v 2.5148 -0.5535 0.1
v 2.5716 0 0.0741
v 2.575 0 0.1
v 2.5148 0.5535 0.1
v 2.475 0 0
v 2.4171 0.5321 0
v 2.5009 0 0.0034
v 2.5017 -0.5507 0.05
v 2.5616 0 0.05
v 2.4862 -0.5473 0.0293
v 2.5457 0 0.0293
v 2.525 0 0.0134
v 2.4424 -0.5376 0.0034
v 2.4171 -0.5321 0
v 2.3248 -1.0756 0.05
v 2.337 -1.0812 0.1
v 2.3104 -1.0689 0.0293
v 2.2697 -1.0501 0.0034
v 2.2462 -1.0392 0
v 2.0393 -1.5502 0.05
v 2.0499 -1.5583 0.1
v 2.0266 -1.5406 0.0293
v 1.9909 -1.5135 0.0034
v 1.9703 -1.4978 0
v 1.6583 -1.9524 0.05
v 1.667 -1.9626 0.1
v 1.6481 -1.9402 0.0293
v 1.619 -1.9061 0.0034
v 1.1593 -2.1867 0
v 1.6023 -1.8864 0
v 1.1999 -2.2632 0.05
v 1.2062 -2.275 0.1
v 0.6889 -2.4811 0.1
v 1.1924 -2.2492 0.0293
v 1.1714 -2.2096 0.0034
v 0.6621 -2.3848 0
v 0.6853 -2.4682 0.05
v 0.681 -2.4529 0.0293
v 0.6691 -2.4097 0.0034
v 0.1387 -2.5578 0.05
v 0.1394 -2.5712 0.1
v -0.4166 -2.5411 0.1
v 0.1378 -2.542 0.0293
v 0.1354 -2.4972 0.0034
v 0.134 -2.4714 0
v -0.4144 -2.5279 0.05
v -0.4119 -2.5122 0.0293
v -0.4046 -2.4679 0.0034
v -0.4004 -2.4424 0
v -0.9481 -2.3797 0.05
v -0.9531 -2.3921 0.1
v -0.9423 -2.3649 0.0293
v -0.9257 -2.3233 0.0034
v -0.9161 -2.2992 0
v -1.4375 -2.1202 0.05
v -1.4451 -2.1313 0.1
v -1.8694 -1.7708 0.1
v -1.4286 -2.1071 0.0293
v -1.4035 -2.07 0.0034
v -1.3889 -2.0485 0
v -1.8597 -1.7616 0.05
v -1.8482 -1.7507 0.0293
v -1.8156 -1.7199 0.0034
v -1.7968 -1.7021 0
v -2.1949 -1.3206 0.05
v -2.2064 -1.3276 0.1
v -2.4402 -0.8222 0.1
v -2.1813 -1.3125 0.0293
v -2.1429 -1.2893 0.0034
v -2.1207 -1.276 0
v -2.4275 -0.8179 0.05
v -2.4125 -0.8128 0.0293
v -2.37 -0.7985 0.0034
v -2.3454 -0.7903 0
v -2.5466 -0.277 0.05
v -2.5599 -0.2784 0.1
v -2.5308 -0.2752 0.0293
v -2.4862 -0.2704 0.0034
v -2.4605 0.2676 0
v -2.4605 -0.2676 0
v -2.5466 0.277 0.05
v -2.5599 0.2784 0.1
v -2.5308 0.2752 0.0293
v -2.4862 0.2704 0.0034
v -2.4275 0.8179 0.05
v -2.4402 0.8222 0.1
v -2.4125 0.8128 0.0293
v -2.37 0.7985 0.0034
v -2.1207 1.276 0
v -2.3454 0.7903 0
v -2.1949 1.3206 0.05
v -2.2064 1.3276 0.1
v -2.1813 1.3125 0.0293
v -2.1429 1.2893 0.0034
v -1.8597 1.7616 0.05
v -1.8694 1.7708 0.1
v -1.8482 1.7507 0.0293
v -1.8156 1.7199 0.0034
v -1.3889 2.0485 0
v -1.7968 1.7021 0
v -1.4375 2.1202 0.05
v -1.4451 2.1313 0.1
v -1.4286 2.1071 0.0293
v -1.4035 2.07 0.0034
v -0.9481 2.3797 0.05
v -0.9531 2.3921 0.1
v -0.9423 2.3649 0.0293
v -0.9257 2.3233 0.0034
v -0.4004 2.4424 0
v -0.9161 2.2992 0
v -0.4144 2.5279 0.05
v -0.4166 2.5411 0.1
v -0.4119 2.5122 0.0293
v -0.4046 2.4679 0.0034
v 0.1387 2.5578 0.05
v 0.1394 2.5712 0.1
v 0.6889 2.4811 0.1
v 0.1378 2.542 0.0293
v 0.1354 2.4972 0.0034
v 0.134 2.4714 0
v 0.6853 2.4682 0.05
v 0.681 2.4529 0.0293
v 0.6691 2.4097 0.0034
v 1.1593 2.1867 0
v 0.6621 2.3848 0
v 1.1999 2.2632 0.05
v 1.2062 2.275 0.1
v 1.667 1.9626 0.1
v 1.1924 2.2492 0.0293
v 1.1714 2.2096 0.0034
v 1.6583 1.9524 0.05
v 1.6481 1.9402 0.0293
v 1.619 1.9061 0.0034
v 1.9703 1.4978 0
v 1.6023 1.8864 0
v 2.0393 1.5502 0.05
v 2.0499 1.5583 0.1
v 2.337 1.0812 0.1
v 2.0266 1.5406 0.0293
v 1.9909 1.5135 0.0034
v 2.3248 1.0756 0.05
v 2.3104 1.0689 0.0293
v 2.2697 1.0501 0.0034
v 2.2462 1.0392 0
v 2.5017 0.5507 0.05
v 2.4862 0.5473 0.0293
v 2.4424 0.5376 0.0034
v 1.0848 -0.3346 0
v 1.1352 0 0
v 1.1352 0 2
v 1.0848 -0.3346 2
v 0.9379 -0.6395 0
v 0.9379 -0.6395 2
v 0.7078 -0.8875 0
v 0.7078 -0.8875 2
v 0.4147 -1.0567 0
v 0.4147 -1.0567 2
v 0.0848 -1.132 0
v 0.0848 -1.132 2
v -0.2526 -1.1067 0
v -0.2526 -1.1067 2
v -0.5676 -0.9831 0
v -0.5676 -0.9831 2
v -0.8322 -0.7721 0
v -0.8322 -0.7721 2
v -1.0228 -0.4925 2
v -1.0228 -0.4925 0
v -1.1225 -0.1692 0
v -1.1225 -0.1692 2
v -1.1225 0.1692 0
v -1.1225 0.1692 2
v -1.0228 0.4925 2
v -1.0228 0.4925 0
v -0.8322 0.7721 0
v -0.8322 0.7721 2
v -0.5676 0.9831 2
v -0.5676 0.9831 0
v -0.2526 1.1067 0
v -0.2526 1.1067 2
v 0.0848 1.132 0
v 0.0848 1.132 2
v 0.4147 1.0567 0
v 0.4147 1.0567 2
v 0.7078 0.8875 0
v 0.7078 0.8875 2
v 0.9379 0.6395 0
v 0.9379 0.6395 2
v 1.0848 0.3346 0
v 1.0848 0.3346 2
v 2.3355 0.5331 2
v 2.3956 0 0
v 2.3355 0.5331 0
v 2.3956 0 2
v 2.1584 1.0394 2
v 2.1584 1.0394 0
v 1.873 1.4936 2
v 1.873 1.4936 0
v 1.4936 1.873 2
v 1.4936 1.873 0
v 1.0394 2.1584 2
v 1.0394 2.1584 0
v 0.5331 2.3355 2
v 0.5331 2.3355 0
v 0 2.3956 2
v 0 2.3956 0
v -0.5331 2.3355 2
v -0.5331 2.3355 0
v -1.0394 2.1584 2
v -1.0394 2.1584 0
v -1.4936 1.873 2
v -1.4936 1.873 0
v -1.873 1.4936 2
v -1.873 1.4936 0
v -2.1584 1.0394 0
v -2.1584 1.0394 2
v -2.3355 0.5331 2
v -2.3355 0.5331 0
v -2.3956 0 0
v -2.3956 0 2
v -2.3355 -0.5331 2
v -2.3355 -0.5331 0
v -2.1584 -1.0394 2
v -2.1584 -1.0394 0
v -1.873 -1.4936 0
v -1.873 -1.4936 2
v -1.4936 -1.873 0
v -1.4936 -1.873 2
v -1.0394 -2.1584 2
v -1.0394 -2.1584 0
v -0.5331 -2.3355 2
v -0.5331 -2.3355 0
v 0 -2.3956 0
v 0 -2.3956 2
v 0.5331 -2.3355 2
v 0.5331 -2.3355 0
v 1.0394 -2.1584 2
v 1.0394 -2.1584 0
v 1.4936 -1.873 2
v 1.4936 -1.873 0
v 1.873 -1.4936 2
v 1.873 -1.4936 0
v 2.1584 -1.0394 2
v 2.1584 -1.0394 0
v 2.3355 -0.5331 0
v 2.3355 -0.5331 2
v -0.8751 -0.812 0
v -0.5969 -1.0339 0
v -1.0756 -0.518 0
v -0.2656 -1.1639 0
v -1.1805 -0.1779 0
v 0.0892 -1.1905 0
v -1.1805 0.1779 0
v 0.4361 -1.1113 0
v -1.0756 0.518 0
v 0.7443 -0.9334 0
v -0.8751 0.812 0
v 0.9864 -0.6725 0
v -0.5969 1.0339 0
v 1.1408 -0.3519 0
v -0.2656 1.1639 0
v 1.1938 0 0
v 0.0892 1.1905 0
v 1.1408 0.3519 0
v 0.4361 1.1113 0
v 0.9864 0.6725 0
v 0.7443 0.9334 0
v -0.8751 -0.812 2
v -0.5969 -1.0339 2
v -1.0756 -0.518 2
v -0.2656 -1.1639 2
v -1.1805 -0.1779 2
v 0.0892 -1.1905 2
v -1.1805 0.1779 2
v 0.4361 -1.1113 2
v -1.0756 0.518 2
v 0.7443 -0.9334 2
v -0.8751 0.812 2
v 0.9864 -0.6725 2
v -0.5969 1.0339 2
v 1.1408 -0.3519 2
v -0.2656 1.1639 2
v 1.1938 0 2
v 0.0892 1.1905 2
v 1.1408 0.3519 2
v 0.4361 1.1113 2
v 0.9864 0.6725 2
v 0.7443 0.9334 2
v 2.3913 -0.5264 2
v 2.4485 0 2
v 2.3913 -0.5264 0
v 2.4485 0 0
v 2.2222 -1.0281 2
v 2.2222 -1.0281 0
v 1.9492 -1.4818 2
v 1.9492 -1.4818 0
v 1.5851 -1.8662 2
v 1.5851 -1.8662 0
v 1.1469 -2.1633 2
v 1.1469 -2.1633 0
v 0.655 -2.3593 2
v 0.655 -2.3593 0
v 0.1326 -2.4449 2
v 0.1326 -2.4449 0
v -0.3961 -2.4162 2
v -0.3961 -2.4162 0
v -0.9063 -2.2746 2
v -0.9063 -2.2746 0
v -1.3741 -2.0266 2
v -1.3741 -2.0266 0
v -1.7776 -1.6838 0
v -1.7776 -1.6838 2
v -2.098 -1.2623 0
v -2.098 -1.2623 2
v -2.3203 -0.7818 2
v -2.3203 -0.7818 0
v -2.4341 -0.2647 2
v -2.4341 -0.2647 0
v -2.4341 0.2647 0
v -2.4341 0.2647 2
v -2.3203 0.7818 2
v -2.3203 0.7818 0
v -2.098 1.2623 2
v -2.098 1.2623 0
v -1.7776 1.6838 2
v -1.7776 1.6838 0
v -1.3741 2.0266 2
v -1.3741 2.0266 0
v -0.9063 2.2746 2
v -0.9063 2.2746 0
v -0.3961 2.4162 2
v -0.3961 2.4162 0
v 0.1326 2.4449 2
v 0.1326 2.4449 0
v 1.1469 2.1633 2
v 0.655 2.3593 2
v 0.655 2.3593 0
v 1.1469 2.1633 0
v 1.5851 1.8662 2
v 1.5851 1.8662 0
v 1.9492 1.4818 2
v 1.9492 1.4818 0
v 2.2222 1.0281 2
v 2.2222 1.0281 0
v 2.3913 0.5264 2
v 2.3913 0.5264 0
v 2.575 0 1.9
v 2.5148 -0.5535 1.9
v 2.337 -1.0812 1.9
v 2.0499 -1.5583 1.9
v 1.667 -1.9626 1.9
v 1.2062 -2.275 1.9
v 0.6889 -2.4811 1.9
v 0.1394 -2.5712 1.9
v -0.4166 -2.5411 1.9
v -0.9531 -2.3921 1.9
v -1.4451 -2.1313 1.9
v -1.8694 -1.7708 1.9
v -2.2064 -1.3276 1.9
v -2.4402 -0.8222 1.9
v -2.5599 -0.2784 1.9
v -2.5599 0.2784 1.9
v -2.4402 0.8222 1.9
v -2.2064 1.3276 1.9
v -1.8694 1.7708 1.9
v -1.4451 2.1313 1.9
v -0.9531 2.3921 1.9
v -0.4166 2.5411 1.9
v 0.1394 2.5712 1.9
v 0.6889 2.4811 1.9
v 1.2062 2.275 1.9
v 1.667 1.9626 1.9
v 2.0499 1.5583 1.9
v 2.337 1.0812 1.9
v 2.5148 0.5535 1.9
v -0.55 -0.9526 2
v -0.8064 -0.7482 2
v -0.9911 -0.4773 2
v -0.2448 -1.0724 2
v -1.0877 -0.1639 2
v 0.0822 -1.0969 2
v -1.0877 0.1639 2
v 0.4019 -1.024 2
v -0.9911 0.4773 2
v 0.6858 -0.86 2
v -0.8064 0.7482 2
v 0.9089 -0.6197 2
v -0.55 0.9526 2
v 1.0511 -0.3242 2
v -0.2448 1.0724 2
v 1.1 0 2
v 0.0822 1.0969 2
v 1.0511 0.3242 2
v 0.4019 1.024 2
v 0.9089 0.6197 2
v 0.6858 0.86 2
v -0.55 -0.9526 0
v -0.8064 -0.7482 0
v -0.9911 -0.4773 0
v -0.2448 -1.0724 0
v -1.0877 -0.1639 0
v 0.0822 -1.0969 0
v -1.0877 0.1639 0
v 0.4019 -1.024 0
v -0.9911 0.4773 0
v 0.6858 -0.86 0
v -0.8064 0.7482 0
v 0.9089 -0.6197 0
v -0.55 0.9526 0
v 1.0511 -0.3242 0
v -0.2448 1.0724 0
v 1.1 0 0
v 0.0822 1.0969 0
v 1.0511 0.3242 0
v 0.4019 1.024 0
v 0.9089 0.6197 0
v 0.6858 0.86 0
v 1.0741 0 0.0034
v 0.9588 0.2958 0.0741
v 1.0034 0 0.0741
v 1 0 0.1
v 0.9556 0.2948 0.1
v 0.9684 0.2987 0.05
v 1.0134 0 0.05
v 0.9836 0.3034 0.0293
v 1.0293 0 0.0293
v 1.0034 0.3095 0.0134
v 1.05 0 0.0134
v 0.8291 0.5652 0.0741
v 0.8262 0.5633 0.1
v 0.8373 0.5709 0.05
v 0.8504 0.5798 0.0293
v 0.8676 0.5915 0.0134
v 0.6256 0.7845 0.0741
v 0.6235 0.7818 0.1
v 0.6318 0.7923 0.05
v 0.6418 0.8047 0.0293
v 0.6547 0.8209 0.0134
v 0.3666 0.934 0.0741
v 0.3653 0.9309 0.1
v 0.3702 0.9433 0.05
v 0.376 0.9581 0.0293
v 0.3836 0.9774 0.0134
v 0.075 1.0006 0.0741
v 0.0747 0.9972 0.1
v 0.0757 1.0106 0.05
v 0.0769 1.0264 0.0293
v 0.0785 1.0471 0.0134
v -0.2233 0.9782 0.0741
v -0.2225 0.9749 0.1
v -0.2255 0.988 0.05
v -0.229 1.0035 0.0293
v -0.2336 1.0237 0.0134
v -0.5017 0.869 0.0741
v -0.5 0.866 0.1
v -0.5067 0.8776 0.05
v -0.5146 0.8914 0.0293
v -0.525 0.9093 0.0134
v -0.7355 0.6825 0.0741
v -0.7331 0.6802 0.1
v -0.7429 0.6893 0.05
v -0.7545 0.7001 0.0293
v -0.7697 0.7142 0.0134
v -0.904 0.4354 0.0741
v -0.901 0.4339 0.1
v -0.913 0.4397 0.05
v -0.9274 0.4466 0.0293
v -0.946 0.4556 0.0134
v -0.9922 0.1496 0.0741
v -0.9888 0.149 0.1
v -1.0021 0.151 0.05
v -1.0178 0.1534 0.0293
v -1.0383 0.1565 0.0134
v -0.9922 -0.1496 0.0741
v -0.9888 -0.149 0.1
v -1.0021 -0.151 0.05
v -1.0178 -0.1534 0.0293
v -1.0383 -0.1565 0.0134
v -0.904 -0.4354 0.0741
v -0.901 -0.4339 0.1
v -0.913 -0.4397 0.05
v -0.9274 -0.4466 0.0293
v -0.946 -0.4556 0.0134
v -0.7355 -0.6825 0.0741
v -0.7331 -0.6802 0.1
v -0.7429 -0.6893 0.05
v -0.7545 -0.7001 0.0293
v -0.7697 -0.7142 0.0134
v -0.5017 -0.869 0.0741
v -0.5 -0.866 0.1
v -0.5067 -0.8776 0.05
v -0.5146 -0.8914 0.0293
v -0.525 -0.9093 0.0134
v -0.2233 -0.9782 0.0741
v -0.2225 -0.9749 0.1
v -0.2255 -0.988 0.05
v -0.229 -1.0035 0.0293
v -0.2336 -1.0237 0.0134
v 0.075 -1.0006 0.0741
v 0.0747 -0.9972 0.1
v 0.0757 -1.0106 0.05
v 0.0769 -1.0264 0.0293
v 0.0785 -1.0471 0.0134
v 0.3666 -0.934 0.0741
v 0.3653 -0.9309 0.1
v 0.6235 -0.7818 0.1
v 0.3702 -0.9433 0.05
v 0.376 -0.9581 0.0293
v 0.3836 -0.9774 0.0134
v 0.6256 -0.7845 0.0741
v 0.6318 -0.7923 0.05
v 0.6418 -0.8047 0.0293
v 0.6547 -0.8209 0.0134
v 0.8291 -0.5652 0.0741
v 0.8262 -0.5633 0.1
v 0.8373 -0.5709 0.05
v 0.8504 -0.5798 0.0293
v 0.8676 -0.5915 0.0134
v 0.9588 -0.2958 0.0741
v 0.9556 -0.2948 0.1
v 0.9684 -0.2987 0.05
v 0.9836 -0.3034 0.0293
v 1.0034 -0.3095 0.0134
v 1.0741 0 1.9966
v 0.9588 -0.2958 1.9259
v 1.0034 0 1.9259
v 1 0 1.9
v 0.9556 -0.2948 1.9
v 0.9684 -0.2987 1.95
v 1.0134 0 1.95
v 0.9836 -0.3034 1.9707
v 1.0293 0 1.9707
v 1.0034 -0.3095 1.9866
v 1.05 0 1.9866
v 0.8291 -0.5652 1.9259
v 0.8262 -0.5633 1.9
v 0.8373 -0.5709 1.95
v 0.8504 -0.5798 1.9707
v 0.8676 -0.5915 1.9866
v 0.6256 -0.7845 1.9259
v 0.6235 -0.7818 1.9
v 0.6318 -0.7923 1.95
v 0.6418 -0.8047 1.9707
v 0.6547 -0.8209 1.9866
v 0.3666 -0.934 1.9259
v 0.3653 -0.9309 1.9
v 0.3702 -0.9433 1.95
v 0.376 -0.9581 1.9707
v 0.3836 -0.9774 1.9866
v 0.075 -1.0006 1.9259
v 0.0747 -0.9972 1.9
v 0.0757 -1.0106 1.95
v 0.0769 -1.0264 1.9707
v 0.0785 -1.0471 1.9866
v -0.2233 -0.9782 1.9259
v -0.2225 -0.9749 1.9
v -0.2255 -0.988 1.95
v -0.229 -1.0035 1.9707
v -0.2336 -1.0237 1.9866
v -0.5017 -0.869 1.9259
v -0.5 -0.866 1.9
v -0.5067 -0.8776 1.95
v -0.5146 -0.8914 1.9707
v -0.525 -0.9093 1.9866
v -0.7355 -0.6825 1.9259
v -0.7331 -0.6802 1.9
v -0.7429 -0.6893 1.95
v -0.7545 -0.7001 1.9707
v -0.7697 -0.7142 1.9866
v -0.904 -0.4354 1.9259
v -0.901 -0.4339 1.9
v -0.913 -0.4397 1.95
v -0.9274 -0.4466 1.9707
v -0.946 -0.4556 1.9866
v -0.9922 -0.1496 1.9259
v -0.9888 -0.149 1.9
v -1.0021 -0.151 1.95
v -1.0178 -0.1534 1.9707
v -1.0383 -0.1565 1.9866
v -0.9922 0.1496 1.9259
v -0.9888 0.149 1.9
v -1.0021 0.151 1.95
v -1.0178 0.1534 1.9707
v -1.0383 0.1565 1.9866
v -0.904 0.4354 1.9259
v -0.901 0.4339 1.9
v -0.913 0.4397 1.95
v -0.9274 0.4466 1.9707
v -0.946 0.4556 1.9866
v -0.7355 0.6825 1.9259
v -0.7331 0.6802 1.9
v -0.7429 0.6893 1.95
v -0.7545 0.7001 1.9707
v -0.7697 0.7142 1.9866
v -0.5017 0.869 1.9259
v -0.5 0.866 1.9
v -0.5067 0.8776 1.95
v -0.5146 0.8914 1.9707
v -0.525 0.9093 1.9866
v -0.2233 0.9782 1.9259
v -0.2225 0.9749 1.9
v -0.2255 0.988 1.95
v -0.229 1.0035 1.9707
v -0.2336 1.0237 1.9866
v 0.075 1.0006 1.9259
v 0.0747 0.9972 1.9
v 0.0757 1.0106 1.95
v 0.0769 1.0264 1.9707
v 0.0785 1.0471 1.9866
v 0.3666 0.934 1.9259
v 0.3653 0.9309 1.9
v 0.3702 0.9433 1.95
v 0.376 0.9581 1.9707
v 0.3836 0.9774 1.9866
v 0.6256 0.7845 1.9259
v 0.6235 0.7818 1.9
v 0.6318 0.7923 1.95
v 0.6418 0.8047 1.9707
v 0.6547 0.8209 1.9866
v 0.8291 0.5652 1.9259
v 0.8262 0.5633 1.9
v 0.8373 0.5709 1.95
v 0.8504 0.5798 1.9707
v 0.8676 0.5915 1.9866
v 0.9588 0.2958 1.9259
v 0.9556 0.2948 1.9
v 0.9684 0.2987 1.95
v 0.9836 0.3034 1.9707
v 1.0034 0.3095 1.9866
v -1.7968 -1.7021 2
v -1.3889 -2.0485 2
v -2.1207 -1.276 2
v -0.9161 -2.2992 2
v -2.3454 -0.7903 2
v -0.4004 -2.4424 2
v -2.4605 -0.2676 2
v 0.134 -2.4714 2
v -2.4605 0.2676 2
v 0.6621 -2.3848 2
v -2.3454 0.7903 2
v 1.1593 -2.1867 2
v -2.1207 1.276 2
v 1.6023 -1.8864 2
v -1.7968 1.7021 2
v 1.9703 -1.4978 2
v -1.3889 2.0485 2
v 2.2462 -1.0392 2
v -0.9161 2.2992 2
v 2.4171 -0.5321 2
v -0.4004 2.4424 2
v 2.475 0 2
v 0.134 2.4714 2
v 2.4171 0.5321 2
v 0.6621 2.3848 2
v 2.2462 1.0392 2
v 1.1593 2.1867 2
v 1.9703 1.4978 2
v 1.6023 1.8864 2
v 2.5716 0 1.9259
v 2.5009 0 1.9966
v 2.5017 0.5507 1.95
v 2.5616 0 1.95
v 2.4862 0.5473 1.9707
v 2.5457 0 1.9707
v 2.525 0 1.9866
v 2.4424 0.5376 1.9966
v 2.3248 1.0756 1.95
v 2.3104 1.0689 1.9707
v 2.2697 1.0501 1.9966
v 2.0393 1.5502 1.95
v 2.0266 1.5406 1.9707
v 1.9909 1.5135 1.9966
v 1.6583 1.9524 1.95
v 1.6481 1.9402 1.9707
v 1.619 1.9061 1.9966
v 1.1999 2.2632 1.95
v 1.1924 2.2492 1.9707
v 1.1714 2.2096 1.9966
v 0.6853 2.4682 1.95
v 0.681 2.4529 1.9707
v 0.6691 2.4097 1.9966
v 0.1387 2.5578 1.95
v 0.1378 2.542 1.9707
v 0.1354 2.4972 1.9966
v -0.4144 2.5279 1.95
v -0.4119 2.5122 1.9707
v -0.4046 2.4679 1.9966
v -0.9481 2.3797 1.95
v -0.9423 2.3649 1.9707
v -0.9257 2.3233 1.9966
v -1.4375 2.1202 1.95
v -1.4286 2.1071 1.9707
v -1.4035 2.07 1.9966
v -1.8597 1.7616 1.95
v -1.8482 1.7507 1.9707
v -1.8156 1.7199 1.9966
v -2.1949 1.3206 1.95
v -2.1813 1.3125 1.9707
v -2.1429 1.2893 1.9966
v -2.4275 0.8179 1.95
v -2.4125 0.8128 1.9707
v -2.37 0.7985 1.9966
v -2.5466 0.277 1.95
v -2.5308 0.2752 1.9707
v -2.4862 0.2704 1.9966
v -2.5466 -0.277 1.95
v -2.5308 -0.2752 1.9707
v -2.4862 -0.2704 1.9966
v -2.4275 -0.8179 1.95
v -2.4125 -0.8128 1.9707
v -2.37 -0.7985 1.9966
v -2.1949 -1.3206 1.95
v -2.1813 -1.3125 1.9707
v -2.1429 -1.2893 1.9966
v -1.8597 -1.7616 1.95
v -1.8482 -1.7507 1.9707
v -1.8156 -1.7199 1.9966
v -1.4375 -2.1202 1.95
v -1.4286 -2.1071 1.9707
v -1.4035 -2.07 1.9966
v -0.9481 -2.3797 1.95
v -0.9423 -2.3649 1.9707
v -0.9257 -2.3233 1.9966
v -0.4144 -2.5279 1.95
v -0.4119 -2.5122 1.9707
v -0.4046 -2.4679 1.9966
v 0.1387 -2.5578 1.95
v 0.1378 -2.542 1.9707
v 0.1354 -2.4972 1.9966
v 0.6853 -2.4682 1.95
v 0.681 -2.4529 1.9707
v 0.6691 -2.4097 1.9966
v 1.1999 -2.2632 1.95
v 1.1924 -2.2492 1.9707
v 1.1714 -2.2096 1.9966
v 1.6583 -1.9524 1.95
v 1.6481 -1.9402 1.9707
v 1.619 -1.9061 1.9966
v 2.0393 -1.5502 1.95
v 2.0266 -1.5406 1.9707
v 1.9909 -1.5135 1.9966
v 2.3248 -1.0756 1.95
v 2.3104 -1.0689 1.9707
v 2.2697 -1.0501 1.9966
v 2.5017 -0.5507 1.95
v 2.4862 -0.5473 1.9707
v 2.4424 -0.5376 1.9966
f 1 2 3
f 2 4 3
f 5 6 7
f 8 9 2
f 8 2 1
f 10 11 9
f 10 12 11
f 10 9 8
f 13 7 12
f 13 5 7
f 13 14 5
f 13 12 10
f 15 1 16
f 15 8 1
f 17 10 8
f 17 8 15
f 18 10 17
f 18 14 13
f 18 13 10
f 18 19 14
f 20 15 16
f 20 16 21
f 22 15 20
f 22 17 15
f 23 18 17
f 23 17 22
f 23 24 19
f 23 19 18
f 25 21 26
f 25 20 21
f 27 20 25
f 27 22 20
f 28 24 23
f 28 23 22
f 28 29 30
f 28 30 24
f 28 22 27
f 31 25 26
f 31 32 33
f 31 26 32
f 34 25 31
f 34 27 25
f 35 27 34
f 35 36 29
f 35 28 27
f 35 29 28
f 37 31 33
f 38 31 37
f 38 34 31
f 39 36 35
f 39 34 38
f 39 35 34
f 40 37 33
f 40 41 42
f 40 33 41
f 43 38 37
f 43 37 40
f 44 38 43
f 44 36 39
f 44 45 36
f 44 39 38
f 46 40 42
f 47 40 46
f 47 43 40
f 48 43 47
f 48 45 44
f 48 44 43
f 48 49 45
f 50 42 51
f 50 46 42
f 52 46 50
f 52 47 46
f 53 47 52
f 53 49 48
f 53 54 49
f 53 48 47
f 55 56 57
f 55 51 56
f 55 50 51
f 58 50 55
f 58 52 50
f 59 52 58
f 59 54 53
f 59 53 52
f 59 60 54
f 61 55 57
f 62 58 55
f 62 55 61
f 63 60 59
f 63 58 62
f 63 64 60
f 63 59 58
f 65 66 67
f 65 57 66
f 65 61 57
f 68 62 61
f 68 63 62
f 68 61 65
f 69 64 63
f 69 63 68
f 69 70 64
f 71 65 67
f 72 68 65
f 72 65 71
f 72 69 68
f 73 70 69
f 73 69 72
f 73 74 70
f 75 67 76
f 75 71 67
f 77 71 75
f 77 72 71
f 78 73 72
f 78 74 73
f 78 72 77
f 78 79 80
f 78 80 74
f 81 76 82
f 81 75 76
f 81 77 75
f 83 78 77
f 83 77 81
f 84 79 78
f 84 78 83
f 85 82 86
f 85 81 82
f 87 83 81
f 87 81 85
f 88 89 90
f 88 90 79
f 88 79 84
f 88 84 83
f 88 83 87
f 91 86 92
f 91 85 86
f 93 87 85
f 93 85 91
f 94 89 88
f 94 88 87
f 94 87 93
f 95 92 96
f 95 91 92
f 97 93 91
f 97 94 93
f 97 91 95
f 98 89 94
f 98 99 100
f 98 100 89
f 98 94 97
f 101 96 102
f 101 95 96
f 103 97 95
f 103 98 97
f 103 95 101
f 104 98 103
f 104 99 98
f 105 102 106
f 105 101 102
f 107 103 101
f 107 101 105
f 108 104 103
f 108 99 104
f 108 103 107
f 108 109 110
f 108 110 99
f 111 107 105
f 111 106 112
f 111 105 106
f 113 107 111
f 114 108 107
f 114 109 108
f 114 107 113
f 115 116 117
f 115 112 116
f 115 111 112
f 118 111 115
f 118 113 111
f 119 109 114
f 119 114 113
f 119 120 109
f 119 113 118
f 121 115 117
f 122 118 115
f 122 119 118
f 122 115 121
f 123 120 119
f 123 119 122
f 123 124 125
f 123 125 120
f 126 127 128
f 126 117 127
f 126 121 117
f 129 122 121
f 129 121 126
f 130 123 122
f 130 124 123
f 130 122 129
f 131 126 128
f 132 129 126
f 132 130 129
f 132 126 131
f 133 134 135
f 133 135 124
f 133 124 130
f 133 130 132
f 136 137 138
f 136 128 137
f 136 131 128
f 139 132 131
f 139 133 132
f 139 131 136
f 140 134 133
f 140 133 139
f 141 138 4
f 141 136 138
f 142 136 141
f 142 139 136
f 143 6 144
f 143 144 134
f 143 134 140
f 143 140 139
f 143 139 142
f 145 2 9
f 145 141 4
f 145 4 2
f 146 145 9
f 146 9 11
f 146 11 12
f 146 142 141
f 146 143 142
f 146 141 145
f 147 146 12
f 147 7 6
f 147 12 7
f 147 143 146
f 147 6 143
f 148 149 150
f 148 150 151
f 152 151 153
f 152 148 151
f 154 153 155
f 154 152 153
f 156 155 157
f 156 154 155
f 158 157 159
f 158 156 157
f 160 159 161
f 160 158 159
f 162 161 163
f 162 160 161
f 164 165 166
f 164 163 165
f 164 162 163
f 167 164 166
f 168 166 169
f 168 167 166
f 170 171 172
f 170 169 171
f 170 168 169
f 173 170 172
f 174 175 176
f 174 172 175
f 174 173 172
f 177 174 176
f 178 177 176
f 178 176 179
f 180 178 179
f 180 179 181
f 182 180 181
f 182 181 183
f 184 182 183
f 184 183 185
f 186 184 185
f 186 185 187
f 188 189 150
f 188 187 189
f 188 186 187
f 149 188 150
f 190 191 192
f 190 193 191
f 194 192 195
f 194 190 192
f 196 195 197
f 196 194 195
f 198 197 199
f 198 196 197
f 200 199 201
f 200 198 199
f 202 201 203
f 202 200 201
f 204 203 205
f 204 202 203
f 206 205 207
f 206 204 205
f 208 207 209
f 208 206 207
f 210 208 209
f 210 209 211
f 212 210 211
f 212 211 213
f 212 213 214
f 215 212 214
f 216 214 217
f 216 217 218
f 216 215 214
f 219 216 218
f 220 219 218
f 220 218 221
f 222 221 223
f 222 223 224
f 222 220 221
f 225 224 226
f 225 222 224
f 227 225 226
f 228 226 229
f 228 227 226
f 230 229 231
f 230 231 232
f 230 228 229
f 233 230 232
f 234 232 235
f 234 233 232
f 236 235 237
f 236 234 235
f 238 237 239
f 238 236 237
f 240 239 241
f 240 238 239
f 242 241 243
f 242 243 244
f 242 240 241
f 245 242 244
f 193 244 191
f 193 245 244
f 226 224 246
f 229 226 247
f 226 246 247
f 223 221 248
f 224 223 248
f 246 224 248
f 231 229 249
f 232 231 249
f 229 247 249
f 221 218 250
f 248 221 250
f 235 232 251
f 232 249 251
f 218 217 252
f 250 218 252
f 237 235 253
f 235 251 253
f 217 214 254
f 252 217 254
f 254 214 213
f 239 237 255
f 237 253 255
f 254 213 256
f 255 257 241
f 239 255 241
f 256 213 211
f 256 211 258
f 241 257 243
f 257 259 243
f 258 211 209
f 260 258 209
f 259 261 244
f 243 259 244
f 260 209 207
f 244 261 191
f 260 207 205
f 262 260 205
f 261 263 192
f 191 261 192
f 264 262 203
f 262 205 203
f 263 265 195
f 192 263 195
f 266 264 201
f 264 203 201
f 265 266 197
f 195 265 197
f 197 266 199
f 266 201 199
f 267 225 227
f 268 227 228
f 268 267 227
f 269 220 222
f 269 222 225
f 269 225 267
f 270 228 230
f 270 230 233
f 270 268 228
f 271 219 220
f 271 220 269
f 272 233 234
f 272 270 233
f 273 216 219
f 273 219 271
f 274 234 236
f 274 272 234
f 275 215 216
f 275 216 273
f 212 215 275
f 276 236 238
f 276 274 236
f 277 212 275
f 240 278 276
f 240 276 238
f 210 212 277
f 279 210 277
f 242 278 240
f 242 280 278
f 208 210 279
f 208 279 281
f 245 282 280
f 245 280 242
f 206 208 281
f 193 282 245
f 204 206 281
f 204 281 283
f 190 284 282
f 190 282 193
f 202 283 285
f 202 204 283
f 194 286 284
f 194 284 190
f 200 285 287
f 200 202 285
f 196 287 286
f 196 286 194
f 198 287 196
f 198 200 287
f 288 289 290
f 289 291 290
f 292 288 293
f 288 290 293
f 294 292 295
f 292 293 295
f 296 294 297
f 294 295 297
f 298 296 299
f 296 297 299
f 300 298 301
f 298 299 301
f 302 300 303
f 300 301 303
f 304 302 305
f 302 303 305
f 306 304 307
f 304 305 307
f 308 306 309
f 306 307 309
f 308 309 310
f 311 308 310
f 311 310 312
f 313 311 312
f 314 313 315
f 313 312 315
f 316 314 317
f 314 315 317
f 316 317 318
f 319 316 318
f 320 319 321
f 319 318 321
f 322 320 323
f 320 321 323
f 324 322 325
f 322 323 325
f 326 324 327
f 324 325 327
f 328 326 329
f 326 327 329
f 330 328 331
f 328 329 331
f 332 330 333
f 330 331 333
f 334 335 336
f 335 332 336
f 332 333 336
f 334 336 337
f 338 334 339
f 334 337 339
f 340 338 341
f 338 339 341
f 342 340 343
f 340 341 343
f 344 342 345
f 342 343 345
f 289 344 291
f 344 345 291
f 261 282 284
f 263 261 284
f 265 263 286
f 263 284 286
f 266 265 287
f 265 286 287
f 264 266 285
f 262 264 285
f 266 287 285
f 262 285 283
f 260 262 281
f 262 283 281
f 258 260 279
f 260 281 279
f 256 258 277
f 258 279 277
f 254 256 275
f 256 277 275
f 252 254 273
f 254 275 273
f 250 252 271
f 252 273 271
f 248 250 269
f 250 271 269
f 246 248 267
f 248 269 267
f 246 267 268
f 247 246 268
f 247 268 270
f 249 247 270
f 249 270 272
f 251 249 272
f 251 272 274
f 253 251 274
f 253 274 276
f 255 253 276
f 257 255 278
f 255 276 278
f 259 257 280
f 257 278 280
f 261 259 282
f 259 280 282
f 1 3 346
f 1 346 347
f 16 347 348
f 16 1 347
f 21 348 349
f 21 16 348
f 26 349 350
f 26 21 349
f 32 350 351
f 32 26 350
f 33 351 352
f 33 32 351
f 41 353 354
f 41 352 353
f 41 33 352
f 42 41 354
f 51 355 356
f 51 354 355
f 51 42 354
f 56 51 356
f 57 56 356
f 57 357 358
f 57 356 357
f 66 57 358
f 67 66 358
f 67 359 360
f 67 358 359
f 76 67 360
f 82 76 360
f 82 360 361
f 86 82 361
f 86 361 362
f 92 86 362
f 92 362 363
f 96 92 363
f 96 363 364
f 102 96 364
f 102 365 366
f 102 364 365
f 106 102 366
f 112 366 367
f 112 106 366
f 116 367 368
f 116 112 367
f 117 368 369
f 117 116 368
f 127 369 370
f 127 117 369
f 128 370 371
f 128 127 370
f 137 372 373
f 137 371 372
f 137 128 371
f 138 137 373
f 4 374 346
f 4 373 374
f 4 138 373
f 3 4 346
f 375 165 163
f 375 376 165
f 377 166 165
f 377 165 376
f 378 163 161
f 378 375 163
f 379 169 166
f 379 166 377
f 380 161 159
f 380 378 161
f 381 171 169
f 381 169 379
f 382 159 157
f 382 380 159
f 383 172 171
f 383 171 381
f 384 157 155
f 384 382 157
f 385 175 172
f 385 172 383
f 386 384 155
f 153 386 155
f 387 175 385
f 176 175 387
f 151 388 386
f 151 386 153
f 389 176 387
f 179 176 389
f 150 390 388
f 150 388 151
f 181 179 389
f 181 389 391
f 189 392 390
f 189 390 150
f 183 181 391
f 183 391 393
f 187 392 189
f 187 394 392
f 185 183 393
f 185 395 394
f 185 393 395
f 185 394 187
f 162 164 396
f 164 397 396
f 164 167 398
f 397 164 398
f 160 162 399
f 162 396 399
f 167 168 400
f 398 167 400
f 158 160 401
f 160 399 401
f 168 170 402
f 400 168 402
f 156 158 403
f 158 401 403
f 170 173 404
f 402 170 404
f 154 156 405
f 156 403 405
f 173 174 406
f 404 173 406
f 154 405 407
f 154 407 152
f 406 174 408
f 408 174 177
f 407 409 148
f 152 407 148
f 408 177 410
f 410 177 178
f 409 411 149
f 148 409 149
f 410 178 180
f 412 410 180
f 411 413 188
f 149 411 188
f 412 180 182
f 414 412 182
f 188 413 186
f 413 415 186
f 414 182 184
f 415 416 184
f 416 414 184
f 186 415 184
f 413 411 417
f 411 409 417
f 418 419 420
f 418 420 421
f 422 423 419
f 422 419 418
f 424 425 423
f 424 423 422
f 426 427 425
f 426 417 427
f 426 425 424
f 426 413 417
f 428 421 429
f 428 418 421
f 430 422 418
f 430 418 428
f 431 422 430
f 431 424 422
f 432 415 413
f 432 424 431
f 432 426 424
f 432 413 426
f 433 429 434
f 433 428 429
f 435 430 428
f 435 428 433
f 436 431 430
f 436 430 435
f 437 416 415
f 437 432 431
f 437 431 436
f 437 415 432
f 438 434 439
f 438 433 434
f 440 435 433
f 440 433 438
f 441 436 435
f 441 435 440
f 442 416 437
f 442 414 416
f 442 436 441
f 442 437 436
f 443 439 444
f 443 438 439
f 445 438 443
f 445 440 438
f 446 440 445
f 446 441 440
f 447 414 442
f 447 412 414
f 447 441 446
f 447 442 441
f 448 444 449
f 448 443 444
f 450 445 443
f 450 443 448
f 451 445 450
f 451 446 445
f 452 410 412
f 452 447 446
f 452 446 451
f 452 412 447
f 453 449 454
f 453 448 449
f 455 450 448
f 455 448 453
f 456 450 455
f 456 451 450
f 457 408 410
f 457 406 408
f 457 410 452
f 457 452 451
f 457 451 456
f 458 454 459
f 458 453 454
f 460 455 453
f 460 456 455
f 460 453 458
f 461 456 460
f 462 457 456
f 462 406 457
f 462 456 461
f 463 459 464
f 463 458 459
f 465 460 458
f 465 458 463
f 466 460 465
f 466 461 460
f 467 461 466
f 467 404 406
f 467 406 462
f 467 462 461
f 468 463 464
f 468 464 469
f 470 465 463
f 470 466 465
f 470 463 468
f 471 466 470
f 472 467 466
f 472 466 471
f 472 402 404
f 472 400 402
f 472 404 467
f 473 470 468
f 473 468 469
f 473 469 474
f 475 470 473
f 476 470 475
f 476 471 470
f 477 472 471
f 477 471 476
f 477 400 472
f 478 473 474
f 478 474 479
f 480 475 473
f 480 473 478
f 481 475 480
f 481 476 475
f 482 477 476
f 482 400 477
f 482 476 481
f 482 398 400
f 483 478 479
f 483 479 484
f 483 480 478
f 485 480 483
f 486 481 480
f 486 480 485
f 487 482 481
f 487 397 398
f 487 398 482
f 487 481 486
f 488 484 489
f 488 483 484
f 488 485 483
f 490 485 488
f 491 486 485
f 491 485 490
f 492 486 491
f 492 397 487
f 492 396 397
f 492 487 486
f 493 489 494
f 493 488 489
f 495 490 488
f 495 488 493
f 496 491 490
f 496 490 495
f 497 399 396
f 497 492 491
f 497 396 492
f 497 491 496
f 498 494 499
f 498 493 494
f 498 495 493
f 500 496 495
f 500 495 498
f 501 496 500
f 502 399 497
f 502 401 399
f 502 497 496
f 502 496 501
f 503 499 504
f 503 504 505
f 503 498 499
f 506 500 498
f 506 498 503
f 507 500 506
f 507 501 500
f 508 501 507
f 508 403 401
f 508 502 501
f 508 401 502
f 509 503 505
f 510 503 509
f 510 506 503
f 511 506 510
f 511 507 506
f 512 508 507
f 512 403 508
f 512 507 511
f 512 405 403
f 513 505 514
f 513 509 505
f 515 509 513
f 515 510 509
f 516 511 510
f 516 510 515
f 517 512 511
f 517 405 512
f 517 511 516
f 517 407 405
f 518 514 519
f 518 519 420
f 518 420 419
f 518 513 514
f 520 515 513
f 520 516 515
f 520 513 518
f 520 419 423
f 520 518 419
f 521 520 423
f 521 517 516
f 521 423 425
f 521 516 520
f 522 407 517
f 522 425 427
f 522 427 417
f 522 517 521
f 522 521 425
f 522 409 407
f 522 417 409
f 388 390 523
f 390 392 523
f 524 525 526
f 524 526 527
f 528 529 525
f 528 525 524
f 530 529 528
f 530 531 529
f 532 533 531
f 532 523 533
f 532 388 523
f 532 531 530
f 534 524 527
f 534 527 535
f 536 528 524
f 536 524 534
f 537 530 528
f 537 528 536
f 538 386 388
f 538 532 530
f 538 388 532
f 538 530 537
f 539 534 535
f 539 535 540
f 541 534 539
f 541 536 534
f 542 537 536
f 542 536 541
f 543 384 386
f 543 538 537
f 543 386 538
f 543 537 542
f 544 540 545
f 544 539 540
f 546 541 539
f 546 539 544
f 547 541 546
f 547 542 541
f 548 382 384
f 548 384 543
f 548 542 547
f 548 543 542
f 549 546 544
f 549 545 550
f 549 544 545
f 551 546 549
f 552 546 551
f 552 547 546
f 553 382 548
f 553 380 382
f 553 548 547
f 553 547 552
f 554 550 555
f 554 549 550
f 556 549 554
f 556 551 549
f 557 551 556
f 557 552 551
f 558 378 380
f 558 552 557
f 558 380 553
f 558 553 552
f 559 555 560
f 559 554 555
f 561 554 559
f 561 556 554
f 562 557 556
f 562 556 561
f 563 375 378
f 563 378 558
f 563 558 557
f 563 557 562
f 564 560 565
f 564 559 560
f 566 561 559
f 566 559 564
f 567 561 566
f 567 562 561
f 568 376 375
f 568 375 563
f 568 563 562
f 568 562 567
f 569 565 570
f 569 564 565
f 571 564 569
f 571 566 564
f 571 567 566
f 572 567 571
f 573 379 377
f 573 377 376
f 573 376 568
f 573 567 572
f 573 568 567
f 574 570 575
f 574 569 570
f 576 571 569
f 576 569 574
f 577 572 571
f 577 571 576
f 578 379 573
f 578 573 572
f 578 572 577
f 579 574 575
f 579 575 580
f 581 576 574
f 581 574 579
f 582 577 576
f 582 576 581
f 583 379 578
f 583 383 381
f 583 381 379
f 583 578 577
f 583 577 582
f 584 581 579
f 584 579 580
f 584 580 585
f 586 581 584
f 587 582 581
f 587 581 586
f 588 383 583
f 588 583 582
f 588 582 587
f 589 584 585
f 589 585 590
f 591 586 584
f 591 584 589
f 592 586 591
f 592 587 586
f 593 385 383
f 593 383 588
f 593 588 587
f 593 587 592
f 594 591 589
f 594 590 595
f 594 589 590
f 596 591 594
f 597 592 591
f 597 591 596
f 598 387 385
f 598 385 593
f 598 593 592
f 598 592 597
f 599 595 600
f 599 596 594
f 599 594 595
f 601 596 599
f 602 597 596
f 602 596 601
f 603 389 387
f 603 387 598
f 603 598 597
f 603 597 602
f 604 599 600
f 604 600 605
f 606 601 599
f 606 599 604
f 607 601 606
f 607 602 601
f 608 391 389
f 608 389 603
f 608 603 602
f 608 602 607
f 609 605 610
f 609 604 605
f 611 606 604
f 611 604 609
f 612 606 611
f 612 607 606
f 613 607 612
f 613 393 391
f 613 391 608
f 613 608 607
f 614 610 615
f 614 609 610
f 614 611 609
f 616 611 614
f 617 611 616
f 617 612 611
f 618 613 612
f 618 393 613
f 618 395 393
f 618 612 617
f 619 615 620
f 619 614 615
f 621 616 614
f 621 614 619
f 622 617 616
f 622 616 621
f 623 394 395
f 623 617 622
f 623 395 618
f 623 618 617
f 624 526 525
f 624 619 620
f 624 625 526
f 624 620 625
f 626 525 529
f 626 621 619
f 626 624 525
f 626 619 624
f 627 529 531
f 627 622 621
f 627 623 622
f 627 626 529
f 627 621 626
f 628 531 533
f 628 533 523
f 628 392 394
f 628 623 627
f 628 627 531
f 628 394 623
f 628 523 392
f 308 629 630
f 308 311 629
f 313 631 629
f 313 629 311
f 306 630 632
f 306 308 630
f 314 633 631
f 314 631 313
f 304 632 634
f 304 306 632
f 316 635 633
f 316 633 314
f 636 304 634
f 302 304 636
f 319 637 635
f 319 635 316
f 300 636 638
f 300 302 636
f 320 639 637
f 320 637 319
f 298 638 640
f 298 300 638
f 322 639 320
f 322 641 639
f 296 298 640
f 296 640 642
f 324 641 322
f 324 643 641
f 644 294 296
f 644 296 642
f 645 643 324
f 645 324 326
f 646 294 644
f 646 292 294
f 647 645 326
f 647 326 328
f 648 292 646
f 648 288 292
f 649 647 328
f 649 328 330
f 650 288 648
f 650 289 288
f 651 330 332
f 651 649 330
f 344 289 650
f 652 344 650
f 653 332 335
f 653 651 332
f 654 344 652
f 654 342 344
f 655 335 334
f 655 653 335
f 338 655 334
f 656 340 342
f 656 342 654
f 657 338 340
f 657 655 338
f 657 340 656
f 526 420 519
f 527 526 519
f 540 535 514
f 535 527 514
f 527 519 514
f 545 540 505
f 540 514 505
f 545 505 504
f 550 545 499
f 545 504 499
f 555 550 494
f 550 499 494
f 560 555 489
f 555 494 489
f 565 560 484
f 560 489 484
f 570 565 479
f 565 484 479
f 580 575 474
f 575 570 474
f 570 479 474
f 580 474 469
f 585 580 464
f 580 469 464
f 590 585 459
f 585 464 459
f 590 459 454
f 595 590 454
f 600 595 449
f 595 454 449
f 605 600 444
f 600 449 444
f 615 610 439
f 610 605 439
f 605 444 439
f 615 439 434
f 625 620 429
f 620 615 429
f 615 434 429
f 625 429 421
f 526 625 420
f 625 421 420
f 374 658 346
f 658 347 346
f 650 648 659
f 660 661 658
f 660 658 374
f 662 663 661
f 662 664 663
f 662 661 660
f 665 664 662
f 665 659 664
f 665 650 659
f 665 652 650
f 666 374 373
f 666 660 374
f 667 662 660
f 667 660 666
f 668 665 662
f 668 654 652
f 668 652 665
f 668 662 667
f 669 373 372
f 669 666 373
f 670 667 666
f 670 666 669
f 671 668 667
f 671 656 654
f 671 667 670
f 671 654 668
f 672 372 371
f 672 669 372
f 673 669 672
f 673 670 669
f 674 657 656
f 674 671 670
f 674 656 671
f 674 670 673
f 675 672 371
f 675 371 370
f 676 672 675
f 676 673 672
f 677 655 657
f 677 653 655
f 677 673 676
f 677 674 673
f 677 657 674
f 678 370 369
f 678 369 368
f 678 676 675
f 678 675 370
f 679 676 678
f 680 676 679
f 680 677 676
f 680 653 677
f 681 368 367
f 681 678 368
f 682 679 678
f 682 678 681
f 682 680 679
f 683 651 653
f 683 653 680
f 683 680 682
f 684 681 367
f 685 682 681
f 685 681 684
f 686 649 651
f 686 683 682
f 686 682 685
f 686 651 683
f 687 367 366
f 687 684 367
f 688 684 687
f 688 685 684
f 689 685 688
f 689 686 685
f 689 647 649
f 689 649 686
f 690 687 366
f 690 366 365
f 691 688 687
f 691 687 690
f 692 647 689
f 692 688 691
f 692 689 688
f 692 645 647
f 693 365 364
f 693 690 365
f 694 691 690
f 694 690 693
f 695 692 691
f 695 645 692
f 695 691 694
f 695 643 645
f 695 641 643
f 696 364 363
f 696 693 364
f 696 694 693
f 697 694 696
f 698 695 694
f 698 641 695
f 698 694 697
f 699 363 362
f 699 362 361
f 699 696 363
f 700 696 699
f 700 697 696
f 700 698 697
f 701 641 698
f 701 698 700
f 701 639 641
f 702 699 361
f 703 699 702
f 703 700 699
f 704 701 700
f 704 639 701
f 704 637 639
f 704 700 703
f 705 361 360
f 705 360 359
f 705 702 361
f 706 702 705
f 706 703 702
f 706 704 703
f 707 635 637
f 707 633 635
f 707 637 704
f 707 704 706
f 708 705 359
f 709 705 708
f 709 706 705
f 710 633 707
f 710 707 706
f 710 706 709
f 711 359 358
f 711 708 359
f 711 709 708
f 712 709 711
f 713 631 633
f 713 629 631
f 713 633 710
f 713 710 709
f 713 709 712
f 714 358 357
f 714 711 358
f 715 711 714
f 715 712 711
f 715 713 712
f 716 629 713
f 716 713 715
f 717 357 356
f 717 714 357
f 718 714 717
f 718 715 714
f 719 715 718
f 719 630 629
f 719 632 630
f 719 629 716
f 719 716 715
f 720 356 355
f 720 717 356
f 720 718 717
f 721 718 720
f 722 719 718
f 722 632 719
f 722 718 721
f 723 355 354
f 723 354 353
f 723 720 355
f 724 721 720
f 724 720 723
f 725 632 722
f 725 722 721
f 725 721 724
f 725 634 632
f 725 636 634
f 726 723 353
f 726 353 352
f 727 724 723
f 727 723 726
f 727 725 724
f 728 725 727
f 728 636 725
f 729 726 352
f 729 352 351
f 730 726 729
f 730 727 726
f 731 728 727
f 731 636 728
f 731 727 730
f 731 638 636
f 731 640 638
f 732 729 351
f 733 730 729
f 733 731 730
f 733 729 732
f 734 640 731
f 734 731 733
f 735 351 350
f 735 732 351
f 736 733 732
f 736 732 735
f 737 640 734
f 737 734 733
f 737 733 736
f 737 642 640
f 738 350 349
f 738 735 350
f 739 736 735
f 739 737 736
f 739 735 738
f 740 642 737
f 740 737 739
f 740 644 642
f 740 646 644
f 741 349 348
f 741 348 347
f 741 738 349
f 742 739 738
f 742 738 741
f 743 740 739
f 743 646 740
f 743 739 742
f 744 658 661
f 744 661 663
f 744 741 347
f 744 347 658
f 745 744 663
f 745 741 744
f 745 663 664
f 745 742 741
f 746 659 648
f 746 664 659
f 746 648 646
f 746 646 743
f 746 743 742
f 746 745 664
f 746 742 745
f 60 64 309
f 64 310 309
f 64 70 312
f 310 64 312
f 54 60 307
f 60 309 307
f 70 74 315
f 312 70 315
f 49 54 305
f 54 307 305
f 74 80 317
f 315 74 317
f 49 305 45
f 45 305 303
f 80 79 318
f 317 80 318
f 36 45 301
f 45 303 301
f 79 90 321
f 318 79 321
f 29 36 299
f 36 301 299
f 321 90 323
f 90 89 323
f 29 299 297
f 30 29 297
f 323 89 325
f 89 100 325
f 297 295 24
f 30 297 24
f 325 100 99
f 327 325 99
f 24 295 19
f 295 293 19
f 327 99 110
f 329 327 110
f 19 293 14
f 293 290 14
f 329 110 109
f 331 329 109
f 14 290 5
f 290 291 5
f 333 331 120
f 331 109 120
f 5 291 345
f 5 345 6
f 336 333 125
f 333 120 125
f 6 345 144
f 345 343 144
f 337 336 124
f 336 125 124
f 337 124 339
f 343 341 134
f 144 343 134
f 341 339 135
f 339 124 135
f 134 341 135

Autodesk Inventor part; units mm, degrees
ref_plane "YZ Plane" through (0, 0, 0) normal (1, 0, 0) x (0, 1, 0)
ref_plane "XZ Plane" through (0, 0, 0) normal (0, 1, 0) x (-1, 0, 0)
ref_plane "XY Plane" through (0, 0, 0) normal (0, 0, 1) x (1, 0, 0)
sketch "Skizze1" plane through (0, 0, 0) normal (0, 0, 1) x (1, 0, 0)
  circle A0 centre (0, 0) radius 2.575 construction
  circle A1 centre (0, 0) radius 1.45 construction
  circle A2 centre (0, 0) radius 2.575
  circle A3 centre (0, 0) radius 2.4485
  circle A4 centre (0, 0) radius 1
  circle A5 centre (0, 0) radius 1.1352
  point P0 (0, 0)
  dimension "d0" = 2
extrude "Extrusion1" add sketch "Skizze1" along normal blind 2
sketch "Skizze2" plane through (0, 0, 2) normal (0, 0, 1) x (1, 0, 0)
  circle A0 centre (0, 0) radius 1.1938
  circle A1 centre (0, 0) radius 2.3956
extrude "Extrusion2" add sketch "Skizze2" against normal up to surface (2 mm away)
fillet "Rundung1" radius 0.1 2 edges at (-2.575, 0, 2) (-2.575, 0, 0)
fillet "Rundung2" radius 0.1 1 edges at (-1, 0, 2)
fillet "Rundung3" radius 0.1 1 edges at (-1, 0, 0)
properties part number "Ballbearing"
